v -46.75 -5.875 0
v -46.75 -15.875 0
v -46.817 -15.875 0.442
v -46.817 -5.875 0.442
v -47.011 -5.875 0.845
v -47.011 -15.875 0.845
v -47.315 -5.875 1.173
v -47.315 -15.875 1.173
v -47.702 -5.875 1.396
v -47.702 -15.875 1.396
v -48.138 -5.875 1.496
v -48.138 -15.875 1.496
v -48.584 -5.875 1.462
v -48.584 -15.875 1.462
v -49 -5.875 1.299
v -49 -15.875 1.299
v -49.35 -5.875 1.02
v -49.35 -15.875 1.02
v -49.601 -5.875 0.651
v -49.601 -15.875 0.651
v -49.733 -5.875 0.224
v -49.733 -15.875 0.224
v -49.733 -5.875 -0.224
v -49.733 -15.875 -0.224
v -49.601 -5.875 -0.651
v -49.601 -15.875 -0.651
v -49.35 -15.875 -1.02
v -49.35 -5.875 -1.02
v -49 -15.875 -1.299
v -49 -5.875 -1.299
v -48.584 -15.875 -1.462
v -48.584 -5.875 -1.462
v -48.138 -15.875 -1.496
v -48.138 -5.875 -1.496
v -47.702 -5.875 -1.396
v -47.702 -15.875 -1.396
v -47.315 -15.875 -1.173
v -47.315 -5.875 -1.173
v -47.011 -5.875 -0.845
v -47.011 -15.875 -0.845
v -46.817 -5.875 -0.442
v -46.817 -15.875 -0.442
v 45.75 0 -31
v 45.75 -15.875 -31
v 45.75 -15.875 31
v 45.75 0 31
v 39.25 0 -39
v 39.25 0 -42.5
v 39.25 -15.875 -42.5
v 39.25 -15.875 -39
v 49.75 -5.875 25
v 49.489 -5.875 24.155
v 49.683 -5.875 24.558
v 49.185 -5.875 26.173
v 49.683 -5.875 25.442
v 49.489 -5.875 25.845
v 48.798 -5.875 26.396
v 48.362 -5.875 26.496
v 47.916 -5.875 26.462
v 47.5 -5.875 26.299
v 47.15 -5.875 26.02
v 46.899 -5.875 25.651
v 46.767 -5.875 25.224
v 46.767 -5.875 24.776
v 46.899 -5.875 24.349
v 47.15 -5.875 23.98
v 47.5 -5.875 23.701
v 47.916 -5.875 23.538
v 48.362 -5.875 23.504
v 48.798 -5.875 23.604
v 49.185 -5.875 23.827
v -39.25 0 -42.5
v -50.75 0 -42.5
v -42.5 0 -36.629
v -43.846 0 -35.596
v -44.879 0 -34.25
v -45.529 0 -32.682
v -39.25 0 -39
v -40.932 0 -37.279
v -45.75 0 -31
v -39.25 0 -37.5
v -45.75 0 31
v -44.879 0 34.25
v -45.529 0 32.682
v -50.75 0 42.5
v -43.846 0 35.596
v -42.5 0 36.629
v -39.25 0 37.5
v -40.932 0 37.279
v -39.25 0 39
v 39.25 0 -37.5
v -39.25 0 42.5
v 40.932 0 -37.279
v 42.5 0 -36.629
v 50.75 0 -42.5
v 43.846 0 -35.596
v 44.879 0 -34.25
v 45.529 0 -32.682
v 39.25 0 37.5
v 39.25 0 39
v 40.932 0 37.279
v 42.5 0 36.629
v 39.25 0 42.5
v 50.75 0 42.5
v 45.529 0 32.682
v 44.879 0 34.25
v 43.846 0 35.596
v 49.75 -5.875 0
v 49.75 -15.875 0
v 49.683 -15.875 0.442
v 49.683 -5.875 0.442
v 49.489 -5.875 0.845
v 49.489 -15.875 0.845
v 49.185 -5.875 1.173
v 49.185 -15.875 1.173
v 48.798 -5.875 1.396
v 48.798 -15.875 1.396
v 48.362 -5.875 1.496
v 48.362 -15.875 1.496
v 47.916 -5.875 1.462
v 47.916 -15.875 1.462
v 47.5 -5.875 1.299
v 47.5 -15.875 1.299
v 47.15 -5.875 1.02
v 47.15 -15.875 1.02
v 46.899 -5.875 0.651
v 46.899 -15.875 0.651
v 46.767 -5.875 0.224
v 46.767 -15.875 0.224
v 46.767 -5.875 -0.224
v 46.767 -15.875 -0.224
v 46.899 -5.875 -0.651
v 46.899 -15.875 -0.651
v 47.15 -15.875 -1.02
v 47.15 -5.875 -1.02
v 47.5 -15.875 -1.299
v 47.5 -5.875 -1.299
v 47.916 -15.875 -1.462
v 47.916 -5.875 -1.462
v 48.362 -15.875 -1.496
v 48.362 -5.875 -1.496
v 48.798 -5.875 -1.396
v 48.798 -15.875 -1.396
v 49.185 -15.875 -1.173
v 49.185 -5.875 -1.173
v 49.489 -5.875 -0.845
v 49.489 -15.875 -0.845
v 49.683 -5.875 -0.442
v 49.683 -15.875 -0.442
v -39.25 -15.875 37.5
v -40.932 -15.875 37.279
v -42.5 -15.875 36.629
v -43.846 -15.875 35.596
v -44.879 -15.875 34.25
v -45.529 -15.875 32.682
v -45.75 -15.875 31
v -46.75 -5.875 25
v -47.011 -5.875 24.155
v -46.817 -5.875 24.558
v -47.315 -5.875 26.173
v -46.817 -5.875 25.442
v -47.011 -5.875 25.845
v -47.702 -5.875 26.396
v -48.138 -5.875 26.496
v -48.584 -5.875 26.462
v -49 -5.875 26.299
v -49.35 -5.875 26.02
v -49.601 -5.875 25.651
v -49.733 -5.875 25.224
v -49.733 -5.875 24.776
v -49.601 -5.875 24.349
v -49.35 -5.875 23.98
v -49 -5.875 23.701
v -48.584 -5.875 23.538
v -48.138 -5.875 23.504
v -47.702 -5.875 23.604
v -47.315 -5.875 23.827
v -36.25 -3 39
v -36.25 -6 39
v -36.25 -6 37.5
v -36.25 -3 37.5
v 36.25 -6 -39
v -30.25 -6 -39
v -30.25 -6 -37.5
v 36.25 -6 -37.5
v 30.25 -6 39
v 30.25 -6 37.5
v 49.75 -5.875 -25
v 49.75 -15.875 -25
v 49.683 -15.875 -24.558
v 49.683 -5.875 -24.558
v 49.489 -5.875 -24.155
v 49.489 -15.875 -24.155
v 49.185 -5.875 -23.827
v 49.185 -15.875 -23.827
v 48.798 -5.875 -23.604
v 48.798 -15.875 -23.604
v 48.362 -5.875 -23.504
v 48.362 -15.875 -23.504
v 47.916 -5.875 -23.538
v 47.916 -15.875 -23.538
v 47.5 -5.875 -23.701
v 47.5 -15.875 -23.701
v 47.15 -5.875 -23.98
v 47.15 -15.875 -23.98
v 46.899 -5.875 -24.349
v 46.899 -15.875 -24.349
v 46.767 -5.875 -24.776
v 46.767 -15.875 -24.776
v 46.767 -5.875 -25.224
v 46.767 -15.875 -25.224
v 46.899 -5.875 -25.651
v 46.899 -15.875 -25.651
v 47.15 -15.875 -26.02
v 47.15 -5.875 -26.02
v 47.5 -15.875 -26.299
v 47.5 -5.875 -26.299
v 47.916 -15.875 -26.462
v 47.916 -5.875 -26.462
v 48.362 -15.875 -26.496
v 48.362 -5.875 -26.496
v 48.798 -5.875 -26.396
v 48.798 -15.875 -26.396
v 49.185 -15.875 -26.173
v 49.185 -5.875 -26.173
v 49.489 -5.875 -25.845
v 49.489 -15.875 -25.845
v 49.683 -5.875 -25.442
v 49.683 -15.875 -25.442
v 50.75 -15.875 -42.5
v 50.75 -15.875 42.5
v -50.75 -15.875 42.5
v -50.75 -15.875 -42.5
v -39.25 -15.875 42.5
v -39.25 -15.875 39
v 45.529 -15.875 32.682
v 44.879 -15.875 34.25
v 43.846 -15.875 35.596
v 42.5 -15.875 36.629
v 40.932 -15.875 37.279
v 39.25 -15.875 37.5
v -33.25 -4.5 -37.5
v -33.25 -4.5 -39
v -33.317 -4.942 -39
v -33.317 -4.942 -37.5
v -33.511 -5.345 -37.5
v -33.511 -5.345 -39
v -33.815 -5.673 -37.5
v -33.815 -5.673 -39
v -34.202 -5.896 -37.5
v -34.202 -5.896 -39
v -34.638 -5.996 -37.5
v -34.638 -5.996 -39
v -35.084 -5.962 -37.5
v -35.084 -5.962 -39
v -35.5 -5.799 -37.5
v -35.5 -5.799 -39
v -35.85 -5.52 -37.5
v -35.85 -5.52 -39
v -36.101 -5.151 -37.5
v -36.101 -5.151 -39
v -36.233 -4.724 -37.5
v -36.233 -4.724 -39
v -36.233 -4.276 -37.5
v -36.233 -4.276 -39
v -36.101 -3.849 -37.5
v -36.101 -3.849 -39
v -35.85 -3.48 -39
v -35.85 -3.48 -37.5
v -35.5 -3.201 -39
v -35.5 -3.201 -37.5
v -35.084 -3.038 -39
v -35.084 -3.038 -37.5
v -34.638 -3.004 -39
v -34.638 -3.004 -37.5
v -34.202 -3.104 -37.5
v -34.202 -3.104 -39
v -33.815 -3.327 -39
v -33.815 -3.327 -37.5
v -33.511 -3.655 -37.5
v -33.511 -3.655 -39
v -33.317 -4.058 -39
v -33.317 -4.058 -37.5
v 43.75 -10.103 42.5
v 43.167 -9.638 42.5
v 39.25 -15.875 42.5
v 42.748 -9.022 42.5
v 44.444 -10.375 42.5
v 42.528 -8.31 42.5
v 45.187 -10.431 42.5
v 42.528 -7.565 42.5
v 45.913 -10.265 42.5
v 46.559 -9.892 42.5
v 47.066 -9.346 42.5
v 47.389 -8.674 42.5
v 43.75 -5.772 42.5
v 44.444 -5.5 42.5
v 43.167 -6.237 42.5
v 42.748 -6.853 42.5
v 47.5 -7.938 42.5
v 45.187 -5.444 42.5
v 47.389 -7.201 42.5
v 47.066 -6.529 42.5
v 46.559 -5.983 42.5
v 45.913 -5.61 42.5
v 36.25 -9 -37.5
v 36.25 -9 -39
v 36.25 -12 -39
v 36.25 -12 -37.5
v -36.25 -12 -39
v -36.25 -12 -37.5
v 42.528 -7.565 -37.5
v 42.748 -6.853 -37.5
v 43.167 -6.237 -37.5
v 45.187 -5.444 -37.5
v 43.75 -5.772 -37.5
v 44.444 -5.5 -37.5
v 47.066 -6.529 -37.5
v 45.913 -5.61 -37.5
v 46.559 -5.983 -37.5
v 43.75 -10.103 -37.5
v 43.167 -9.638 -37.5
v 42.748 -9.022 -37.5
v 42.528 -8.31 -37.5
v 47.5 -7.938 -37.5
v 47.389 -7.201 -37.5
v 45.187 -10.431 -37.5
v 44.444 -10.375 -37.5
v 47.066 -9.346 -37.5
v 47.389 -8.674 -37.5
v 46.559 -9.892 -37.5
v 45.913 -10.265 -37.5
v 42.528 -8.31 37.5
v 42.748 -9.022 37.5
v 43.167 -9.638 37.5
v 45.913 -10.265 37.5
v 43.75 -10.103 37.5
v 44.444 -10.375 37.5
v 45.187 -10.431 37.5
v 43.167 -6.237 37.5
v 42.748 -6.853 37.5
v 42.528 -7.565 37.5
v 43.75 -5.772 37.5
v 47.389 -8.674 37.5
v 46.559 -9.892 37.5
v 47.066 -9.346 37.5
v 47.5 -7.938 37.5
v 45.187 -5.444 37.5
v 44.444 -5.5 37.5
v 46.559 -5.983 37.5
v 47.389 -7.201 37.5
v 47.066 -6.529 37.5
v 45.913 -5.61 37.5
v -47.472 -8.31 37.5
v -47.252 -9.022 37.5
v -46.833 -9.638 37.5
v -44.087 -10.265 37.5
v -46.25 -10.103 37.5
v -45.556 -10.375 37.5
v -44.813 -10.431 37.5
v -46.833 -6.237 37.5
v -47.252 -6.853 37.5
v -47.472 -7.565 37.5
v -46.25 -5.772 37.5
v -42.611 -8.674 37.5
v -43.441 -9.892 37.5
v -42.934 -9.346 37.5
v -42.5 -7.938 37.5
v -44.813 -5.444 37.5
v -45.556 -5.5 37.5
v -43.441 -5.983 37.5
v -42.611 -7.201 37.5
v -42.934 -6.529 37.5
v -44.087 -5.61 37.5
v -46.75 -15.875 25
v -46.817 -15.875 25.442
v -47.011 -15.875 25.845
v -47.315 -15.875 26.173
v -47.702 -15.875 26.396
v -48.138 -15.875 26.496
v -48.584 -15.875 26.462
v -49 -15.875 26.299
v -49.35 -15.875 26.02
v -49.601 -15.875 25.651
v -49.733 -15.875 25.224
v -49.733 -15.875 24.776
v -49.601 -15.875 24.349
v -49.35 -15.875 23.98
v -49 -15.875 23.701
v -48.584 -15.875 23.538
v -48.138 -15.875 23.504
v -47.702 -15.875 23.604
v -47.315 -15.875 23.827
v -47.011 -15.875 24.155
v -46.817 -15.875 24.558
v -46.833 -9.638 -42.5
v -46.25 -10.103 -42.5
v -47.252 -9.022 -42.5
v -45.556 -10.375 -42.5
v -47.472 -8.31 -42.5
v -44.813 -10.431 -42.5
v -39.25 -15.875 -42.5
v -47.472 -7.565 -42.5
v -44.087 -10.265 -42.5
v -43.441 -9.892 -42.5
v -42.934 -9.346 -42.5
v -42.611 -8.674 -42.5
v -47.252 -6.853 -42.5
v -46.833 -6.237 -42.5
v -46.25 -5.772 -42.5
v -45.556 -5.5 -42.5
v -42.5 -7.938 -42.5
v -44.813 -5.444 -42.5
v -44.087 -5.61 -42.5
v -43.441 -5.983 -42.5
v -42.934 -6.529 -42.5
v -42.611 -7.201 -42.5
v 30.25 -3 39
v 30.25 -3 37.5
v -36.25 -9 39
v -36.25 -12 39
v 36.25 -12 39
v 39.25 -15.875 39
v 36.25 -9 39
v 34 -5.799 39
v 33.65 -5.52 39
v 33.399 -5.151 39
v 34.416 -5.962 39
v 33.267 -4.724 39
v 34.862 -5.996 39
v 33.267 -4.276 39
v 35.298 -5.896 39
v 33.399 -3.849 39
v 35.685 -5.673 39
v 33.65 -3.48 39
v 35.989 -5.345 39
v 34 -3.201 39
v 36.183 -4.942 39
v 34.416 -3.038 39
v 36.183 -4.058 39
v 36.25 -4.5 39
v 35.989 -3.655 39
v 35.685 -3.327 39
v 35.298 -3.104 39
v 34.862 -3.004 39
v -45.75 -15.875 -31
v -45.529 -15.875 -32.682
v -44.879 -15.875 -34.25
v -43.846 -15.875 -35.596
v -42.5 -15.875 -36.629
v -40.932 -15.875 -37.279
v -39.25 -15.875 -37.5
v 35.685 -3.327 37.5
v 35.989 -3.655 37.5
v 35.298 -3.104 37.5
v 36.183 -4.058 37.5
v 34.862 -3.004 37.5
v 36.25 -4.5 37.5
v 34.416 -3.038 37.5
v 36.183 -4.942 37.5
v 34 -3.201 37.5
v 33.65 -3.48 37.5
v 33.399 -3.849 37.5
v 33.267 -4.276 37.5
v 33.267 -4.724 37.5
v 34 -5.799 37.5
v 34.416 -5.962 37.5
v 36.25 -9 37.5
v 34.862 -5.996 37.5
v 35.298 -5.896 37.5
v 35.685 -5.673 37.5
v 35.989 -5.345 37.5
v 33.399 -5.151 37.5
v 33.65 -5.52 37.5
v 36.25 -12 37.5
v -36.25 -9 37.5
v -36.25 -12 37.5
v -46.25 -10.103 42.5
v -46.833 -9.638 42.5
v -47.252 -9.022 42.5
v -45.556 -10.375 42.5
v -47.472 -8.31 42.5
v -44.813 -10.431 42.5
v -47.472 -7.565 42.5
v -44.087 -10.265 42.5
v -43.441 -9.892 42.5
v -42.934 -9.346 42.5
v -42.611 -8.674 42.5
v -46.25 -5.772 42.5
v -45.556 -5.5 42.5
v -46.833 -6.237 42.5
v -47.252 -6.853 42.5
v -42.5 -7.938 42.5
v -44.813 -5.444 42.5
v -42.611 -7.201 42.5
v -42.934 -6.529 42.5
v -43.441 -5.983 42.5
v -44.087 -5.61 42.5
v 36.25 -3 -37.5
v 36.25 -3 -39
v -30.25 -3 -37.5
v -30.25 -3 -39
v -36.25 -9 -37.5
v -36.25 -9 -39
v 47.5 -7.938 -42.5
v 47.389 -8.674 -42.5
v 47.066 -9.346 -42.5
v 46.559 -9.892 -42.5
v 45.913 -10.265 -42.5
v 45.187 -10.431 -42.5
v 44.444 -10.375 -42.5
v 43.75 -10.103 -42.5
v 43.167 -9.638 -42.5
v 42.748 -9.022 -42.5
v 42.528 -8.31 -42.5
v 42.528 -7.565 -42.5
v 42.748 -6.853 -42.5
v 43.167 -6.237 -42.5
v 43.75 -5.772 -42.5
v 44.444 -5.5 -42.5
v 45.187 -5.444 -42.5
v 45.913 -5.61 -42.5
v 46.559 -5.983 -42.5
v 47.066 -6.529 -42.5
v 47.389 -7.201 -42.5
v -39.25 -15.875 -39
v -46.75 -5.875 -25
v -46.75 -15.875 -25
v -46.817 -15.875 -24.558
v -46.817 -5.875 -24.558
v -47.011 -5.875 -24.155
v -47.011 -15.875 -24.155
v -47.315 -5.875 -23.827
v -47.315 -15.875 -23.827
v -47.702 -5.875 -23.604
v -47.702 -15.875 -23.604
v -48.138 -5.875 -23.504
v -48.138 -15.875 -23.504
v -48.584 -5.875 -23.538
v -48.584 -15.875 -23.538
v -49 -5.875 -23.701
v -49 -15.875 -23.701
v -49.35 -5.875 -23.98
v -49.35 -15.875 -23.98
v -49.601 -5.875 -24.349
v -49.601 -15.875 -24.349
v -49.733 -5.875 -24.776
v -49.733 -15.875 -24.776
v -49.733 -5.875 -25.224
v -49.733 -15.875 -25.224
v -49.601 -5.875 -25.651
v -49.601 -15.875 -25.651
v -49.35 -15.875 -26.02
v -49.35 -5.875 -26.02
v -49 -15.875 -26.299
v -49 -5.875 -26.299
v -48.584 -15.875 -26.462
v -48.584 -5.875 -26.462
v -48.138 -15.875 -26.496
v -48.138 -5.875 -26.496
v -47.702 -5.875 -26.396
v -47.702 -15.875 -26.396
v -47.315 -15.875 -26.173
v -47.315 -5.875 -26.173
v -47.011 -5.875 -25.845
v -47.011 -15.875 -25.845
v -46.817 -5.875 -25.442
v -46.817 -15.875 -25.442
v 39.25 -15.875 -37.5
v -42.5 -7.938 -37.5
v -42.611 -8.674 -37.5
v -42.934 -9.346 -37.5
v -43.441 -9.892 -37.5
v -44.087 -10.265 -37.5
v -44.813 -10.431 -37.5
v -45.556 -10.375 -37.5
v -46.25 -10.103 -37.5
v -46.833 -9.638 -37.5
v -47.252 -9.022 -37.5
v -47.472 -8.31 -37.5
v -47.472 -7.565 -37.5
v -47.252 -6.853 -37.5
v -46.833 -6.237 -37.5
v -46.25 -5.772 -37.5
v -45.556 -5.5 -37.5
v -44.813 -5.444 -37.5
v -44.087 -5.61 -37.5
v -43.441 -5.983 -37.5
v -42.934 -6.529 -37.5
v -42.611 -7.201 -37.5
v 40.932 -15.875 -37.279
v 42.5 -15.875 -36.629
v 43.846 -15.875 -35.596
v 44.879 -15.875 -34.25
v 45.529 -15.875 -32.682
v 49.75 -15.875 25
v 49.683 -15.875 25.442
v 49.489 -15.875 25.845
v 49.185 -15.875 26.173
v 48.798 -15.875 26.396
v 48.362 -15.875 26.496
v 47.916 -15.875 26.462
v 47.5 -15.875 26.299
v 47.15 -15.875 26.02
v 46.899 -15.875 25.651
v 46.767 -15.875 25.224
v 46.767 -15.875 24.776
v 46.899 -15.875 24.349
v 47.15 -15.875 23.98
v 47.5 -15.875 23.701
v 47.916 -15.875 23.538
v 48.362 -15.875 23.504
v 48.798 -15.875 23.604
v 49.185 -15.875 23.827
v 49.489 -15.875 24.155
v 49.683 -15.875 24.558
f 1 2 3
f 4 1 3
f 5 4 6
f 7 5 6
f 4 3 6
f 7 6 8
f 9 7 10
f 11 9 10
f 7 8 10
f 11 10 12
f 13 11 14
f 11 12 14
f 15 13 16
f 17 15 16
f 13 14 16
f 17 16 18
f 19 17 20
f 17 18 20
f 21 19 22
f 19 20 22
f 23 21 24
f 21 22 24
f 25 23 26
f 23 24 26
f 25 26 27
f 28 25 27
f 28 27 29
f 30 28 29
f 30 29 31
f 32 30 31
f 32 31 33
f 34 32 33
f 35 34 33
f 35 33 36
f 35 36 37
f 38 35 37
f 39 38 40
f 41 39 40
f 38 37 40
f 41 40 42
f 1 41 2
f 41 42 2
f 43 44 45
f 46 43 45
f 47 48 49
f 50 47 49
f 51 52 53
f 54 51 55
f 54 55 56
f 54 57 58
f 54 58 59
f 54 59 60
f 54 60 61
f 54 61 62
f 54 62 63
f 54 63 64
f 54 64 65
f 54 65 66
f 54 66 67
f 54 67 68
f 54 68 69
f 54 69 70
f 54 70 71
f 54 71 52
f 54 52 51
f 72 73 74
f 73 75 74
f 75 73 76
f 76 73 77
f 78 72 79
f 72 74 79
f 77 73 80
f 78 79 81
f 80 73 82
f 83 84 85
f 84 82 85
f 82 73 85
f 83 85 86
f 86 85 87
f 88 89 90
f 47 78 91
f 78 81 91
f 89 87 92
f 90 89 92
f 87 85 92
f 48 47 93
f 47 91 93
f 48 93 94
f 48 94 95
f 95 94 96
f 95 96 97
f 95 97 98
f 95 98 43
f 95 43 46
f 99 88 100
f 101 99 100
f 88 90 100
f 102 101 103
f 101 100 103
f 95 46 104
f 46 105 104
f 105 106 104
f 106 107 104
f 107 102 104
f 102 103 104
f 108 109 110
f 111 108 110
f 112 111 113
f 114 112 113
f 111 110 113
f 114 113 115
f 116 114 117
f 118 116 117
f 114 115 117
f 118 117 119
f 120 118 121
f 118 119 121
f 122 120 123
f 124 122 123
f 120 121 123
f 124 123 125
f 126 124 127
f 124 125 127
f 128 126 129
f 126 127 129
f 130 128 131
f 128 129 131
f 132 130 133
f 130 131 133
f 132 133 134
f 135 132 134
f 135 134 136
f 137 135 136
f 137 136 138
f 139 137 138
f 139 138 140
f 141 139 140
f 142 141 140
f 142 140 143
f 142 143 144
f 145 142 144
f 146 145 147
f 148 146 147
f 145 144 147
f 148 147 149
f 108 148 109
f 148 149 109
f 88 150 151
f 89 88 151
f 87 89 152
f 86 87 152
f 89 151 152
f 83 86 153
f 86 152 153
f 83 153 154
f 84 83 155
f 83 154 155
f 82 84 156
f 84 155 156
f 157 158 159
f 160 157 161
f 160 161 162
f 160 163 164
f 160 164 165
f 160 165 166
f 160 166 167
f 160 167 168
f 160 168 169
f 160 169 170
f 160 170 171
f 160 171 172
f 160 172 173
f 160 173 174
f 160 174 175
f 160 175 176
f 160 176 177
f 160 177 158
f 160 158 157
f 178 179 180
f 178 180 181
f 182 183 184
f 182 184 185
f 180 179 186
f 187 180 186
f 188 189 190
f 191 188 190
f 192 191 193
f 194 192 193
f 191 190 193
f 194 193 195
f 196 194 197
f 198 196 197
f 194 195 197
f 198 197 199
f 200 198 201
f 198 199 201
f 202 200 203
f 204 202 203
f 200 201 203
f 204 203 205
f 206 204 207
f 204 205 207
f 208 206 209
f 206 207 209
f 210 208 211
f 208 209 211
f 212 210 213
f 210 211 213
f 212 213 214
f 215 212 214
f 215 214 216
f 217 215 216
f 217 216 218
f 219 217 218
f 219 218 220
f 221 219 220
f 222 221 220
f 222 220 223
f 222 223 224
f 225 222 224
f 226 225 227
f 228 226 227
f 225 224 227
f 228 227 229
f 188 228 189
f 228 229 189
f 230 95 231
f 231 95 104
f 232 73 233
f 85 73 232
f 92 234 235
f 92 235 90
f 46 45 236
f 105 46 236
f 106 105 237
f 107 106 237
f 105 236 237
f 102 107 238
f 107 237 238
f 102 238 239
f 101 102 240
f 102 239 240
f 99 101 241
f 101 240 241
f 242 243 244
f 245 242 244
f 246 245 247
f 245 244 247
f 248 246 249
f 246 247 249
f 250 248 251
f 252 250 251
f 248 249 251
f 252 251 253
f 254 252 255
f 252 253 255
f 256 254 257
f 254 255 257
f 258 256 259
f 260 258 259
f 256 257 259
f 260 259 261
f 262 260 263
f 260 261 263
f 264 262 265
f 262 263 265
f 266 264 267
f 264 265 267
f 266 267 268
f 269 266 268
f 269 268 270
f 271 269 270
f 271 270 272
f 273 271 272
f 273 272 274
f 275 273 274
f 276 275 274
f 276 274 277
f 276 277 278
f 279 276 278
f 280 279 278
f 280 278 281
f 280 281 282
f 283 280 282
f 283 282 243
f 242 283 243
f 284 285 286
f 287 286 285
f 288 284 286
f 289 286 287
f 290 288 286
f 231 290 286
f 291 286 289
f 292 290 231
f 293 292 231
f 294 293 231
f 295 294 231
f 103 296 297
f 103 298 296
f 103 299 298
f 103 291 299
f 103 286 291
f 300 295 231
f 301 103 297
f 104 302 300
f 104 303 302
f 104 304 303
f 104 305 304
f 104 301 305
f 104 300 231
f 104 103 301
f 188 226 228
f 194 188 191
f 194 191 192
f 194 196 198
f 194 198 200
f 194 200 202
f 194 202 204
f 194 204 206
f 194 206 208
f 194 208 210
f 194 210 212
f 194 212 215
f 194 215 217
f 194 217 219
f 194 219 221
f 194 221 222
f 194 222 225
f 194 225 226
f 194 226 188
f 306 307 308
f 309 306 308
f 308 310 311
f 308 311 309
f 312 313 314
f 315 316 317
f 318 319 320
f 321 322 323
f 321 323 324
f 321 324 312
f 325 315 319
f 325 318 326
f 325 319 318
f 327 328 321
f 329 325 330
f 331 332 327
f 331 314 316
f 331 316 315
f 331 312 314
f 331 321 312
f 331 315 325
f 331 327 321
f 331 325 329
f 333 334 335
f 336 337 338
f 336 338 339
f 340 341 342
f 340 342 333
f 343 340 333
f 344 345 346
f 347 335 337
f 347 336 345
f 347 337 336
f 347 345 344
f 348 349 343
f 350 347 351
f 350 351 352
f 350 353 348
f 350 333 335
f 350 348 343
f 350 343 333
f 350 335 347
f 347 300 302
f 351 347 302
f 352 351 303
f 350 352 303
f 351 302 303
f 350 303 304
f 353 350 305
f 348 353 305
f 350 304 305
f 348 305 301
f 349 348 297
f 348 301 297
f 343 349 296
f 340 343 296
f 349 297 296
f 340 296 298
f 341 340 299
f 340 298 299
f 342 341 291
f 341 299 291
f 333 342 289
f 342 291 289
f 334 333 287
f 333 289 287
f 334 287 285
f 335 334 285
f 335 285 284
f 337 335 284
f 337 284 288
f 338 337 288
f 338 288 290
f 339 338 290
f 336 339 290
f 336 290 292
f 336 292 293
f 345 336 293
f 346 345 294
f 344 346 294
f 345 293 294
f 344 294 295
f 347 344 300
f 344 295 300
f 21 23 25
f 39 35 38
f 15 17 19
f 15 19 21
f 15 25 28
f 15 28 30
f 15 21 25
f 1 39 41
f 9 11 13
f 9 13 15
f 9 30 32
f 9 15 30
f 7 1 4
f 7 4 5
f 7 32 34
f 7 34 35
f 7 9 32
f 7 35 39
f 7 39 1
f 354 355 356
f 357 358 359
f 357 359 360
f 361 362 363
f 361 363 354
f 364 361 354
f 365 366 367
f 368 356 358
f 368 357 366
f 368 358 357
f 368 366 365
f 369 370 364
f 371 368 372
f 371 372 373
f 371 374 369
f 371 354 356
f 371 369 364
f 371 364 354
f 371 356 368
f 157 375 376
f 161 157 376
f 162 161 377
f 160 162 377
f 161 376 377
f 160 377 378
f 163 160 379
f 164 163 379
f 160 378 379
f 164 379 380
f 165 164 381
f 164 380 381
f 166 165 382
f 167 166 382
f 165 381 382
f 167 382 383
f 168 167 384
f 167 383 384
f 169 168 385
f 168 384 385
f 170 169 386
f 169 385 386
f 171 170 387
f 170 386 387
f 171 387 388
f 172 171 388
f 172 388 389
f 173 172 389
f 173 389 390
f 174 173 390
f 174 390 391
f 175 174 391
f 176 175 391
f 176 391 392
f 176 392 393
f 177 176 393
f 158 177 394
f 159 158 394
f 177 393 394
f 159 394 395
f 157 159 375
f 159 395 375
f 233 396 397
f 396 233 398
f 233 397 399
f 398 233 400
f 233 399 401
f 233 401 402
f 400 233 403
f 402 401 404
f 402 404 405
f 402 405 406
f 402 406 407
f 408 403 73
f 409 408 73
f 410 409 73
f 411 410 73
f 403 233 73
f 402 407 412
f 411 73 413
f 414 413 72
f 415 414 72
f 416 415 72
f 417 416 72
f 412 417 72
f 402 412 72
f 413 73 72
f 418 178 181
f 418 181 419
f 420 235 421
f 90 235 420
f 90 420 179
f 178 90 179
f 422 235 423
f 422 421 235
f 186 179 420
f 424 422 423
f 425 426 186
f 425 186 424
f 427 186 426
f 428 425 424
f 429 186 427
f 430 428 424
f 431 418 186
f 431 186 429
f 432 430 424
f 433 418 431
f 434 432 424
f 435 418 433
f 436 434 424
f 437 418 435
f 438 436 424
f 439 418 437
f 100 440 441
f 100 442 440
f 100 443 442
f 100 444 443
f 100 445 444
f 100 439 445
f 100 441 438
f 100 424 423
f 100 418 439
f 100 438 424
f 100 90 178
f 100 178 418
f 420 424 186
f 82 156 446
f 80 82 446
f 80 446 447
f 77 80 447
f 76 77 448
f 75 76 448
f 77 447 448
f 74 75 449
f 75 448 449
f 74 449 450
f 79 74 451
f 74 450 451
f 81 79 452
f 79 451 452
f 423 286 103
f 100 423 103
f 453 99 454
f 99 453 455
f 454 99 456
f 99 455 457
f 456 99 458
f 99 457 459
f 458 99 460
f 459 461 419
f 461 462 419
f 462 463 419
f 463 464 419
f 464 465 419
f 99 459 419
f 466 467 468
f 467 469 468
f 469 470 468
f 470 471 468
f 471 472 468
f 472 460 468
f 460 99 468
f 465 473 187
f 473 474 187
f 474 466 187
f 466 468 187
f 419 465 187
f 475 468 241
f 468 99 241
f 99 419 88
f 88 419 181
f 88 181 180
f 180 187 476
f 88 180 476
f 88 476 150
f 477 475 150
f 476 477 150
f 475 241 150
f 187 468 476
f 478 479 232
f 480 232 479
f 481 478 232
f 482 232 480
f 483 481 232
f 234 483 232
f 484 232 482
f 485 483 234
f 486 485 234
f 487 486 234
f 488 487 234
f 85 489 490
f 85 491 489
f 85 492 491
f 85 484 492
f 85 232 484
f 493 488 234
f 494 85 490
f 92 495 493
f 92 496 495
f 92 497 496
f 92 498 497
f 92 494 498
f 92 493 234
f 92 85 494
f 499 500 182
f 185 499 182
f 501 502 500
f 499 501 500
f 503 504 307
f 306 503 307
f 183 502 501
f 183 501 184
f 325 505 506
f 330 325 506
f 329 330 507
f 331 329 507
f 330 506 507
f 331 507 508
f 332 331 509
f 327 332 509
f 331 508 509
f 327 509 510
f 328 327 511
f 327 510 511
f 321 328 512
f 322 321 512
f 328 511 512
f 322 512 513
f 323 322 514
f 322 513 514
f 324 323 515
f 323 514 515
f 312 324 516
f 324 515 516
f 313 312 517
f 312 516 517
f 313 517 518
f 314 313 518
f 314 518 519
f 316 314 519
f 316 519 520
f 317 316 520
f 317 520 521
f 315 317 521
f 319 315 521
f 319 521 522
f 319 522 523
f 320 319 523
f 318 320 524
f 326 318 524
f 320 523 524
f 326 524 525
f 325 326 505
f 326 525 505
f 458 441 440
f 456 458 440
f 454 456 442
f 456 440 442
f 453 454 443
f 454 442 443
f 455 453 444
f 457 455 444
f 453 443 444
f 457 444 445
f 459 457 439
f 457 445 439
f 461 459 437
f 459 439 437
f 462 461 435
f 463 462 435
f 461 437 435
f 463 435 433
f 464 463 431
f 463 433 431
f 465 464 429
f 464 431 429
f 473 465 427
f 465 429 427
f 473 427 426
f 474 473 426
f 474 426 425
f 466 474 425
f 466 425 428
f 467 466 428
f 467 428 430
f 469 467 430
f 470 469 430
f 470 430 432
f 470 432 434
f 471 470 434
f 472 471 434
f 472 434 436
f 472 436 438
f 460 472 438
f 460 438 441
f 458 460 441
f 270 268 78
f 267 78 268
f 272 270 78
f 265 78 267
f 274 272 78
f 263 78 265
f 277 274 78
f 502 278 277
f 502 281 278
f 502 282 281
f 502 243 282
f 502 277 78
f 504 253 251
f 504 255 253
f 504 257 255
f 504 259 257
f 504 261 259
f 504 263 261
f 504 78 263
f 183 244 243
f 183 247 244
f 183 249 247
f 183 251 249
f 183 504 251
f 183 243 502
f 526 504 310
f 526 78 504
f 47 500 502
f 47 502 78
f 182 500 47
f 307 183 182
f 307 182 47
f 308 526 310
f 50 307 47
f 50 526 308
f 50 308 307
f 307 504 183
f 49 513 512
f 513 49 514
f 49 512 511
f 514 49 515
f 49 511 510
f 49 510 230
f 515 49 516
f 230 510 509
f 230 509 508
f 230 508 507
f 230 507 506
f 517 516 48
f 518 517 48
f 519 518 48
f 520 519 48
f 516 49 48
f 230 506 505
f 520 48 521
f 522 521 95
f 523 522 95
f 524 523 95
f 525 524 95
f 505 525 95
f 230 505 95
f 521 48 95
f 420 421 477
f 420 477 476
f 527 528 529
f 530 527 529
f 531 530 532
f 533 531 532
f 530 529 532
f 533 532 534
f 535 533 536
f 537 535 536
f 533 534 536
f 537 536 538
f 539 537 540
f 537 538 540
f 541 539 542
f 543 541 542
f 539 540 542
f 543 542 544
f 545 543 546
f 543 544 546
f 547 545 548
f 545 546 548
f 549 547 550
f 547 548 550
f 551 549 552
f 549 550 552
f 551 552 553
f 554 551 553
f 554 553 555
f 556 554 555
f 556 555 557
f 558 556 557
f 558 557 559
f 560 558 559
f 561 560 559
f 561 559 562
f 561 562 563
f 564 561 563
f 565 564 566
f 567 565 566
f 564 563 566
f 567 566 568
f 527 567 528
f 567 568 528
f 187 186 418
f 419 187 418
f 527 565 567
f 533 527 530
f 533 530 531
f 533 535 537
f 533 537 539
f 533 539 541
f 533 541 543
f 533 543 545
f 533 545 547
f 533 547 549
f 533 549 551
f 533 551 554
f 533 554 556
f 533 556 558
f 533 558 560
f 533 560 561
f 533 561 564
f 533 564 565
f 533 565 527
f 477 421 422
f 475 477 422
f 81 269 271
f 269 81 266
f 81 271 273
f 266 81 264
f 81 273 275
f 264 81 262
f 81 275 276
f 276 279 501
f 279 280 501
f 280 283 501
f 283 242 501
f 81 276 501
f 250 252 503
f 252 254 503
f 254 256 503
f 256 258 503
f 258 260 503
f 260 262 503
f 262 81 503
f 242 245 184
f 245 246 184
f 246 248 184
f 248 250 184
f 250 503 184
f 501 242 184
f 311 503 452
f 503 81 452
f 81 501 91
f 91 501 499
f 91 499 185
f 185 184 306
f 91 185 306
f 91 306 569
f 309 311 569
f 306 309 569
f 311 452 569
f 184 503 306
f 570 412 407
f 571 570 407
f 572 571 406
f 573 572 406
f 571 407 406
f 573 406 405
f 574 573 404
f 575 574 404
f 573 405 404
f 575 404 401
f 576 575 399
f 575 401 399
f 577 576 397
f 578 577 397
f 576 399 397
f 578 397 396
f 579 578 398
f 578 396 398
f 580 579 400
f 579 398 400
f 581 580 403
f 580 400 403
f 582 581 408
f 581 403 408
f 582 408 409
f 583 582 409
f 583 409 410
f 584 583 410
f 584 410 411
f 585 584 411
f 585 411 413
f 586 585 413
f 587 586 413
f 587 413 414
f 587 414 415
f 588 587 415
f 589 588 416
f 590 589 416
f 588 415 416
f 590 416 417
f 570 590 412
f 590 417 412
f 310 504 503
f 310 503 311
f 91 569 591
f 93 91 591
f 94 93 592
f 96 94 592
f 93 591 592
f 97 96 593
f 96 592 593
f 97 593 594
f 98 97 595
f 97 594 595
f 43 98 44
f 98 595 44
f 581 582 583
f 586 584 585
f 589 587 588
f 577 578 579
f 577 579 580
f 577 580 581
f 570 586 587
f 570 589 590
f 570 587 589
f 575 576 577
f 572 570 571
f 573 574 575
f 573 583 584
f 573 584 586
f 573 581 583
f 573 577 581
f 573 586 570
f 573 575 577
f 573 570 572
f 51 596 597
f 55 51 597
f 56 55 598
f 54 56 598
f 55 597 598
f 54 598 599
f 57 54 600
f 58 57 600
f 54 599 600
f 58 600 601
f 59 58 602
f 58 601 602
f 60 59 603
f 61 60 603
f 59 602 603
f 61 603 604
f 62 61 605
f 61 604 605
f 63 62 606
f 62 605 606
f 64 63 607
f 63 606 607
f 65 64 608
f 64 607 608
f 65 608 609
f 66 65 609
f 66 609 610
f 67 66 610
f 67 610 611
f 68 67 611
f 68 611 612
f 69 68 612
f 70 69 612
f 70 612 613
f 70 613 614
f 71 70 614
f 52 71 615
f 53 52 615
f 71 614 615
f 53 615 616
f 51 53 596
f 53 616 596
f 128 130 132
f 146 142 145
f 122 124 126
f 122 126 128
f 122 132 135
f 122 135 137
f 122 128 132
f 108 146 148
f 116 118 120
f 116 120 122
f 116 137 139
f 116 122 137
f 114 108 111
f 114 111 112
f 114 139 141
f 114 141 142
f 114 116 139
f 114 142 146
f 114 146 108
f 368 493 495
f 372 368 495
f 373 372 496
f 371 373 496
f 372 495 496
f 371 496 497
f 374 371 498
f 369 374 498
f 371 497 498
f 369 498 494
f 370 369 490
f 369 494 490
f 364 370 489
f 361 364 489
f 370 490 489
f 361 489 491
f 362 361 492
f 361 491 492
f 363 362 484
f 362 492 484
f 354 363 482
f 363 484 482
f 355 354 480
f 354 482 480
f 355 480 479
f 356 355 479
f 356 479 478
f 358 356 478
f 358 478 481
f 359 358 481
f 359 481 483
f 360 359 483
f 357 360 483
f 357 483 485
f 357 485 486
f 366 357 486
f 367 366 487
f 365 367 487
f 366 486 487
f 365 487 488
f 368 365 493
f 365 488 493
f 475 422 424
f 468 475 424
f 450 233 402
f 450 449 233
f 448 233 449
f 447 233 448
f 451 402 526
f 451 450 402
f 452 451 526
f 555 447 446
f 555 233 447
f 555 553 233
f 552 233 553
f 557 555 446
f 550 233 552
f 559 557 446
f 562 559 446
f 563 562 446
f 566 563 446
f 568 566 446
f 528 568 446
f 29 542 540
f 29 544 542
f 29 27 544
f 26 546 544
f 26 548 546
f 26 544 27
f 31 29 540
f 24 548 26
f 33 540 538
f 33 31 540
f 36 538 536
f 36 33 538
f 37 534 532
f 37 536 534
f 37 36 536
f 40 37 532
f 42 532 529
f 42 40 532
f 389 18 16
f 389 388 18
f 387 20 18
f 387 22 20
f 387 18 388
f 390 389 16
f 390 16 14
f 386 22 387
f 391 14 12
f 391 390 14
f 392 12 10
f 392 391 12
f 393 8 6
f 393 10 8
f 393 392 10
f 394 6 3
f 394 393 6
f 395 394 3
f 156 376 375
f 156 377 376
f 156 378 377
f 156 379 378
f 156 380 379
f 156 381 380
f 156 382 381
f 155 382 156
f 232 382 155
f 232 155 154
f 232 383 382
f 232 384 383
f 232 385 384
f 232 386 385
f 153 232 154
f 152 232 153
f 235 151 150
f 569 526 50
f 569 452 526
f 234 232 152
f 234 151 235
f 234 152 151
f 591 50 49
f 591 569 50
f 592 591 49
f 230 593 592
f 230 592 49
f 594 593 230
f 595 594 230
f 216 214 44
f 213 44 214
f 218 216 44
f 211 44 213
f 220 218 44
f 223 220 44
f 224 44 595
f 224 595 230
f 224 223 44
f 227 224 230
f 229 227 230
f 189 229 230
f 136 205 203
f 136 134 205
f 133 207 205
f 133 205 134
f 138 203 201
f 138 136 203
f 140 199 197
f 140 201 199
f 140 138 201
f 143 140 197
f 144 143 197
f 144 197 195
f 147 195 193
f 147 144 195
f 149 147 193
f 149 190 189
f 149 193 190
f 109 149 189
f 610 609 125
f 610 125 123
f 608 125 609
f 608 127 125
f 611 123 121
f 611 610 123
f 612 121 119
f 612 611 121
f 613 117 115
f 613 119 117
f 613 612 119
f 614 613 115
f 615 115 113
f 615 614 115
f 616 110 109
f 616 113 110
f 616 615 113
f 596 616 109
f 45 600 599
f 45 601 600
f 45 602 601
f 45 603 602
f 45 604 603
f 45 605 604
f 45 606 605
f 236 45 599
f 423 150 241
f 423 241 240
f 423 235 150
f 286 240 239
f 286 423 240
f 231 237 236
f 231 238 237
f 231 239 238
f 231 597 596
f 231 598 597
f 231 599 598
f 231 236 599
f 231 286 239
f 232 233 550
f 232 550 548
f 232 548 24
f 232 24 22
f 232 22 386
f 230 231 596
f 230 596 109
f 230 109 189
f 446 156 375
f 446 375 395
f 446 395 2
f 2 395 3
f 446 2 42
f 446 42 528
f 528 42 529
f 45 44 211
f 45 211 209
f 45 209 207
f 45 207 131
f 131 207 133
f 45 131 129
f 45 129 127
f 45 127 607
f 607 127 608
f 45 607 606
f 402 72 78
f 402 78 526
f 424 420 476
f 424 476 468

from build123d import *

# Parameters (mm, degrees)
F0_W      = 101.5
F0_H      = 85
F1_DEPTH  = 15.875
F3_DEPTH  = 25
F4_W      = 78.5
F4_H      = 15.875
F5_DEPTH  = 3.5
F6_W      = 78.5
F6_H      = 15.875
F7_DEPTH  = 3.5
F8_R      = 1.5
F8_W      = 66.5
F8_H      = 3
F8_W_2    = 72.5
F9_DEPTH  = 25
F10_W     = 72.5
F10_H     = 3
F10_W_2   = 66.5
F10_R     = 1.5
F11_DEPTH = 25
F12_R     = 2.5
F13_DEPTH = 5
F14_R     = 2.5
F15_DEPTH = 5
F16_R     = 2.5
F17_DEPTH = 5
F18_R     = 2.5
F19_DEPTH = 5
F20_R     = 1.5
F21_DEPTH = 10


with BuildPart() as f1:
    # F0 (on Front) → F1 (new body)
    with BuildSketch(Plane.XZ):
        Rectangle(F0_W, F0_H)
    extrude(amount=F1_DEPTH)

    # F2 (on face) → F3 (cut)
    with BuildSketch(Plane.XZ.offset(15.875)):
        with BuildLine():
            Line((-45.75, 31), (-45.75, -31))
            ThreePointArc((-45.75, -31), (-43.846194, -35.596194), (-39.25, -37.5))
            Line((-39.25, -37.5), (39.25, -37.5))
            ThreePointArc((39.25, -37.5), (43.846194, -35.596194), (45.75, -31))
            Line((45.75, -31), (45.75, 31))
            ThreePointArc((45.75, 31), (43.846194, 35.596194), (39.25, 37.5))
            Line((39.25, 37.5), (-39.25, 37.5))
            ThreePointArc((-39.25, 37.5), (-43.846194, 35.596194), (-45.75, 31))
        make_face()
    extrude(amount=-F3_DEPTH, mode=Mode.SUBTRACT)

    # F4 (on face) → F5 (cut)
    with BuildSketch(Plane.XY.offset(42.5)):
        with Locations((0, -7.9375)):
            Rectangle(F4_W, F4_H)
    extrude(amount=-F5_DEPTH, mode=Mode.SUBTRACT)

    # F6 (on face) → F7 (cut)
    with BuildSketch(Plane(origin=(0, 0, -42.5), x_dir=(1, 0, 0), z_dir=(0, 0, -1))):
        with Locations((0, 7.9375)):
            Rectangle(F6_W, F6_H)
    extrude(amount=-F7_DEPTH, mode=Mode.SUBTRACT)

    # F8 (on face) → F9 (cut)
    with BuildSketch(Plane.XY.offset(39)):
        with Locations((34.75, -4.5)):
            Circle(F8_R)
        with Locations((-3, -4.5)):
            Rectangle(F8_W, F8_H)
        with Locations((0, -10.5)):
            Rectangle(F8_W_2, F8_H)
    extrude(amount=-F9_DEPTH, mode=Mode.SUBTRACT)

    # F10 (on face) → F11 (cut)
    with BuildSketch(Plane(origin=(0, 0, -39), x_dir=(1, 0, 0), z_dir=(0, 0, -1))):
        with Locations((0, 10.5)):
            Rectangle(F10_W, F10_H)
        with Locations((3, 4.5)):
            Rectangle(F10_W_2, F10_H)
        with Locations((-34.75, 4.5)):
            Circle(F10_R)
    extrude(amount=-F11_DEPTH, mode=Mode.SUBTRACT)

    # F12 (on face) → F13 (cut)
    with BuildSketch(Plane(origin=(0, 0, -42.5), x_dir=(1, 0, 0), z_dir=(0, 0, -1))):
        with Locations((-45, 7.9375)):
            Circle(F12_R)
    extrude(amount=-F13_DEPTH, mode=Mode.SUBTRACT)

    # F14 (on face) → F15 (cut)
    with BuildSketch(Plane(origin=(0, 0, -42.5), x_dir=(1, 0, 0), z_dir=(0, 0, -1))):
        with Locations((45, 7.9375)):
            Circle(F14_R)
    extrude(amount=-F15_DEPTH, mode=Mode.SUBTRACT)

    # F16 (on face) → F17 (cut)
    with BuildSketch(Plane.XY.offset(42.5)):
        with Locations((-45, -7.9375)):
            Circle(F16_R)
    extrude(amount=-F17_DEPTH, mode=Mode.SUBTRACT)

    # F18 (on face) → F19 (cut)
    with BuildSketch(Plane.XY.offset(42.5)):
        with Locations((45, -7.9375)):
            Circle(F18_R)
    extrude(amount=-F19_DEPTH, mode=Mode.SUBTRACT)

    # F20 (on face) → F21 (cut)
    with BuildSketch(Plane.XZ.offset(15.875)):
        with Locations((-48.25, 25)):
            Circle(F20_R)
        with Locations((-48.25, 0)):
            Circle(F20_R)
        with Locations((-48.25, -25)):
            Circle(F20_R)
        with Locations((48.25, -25)):
            Circle(F20_R)
        with Locations((48.25, 0)):
            Circle(F20_R)
        with Locations((48.25, 25)):
            Circle(F20_R)
    extrude(amount=-F21_DEPTH, mode=Mode.SUBTRACT)


solid = f1.part
